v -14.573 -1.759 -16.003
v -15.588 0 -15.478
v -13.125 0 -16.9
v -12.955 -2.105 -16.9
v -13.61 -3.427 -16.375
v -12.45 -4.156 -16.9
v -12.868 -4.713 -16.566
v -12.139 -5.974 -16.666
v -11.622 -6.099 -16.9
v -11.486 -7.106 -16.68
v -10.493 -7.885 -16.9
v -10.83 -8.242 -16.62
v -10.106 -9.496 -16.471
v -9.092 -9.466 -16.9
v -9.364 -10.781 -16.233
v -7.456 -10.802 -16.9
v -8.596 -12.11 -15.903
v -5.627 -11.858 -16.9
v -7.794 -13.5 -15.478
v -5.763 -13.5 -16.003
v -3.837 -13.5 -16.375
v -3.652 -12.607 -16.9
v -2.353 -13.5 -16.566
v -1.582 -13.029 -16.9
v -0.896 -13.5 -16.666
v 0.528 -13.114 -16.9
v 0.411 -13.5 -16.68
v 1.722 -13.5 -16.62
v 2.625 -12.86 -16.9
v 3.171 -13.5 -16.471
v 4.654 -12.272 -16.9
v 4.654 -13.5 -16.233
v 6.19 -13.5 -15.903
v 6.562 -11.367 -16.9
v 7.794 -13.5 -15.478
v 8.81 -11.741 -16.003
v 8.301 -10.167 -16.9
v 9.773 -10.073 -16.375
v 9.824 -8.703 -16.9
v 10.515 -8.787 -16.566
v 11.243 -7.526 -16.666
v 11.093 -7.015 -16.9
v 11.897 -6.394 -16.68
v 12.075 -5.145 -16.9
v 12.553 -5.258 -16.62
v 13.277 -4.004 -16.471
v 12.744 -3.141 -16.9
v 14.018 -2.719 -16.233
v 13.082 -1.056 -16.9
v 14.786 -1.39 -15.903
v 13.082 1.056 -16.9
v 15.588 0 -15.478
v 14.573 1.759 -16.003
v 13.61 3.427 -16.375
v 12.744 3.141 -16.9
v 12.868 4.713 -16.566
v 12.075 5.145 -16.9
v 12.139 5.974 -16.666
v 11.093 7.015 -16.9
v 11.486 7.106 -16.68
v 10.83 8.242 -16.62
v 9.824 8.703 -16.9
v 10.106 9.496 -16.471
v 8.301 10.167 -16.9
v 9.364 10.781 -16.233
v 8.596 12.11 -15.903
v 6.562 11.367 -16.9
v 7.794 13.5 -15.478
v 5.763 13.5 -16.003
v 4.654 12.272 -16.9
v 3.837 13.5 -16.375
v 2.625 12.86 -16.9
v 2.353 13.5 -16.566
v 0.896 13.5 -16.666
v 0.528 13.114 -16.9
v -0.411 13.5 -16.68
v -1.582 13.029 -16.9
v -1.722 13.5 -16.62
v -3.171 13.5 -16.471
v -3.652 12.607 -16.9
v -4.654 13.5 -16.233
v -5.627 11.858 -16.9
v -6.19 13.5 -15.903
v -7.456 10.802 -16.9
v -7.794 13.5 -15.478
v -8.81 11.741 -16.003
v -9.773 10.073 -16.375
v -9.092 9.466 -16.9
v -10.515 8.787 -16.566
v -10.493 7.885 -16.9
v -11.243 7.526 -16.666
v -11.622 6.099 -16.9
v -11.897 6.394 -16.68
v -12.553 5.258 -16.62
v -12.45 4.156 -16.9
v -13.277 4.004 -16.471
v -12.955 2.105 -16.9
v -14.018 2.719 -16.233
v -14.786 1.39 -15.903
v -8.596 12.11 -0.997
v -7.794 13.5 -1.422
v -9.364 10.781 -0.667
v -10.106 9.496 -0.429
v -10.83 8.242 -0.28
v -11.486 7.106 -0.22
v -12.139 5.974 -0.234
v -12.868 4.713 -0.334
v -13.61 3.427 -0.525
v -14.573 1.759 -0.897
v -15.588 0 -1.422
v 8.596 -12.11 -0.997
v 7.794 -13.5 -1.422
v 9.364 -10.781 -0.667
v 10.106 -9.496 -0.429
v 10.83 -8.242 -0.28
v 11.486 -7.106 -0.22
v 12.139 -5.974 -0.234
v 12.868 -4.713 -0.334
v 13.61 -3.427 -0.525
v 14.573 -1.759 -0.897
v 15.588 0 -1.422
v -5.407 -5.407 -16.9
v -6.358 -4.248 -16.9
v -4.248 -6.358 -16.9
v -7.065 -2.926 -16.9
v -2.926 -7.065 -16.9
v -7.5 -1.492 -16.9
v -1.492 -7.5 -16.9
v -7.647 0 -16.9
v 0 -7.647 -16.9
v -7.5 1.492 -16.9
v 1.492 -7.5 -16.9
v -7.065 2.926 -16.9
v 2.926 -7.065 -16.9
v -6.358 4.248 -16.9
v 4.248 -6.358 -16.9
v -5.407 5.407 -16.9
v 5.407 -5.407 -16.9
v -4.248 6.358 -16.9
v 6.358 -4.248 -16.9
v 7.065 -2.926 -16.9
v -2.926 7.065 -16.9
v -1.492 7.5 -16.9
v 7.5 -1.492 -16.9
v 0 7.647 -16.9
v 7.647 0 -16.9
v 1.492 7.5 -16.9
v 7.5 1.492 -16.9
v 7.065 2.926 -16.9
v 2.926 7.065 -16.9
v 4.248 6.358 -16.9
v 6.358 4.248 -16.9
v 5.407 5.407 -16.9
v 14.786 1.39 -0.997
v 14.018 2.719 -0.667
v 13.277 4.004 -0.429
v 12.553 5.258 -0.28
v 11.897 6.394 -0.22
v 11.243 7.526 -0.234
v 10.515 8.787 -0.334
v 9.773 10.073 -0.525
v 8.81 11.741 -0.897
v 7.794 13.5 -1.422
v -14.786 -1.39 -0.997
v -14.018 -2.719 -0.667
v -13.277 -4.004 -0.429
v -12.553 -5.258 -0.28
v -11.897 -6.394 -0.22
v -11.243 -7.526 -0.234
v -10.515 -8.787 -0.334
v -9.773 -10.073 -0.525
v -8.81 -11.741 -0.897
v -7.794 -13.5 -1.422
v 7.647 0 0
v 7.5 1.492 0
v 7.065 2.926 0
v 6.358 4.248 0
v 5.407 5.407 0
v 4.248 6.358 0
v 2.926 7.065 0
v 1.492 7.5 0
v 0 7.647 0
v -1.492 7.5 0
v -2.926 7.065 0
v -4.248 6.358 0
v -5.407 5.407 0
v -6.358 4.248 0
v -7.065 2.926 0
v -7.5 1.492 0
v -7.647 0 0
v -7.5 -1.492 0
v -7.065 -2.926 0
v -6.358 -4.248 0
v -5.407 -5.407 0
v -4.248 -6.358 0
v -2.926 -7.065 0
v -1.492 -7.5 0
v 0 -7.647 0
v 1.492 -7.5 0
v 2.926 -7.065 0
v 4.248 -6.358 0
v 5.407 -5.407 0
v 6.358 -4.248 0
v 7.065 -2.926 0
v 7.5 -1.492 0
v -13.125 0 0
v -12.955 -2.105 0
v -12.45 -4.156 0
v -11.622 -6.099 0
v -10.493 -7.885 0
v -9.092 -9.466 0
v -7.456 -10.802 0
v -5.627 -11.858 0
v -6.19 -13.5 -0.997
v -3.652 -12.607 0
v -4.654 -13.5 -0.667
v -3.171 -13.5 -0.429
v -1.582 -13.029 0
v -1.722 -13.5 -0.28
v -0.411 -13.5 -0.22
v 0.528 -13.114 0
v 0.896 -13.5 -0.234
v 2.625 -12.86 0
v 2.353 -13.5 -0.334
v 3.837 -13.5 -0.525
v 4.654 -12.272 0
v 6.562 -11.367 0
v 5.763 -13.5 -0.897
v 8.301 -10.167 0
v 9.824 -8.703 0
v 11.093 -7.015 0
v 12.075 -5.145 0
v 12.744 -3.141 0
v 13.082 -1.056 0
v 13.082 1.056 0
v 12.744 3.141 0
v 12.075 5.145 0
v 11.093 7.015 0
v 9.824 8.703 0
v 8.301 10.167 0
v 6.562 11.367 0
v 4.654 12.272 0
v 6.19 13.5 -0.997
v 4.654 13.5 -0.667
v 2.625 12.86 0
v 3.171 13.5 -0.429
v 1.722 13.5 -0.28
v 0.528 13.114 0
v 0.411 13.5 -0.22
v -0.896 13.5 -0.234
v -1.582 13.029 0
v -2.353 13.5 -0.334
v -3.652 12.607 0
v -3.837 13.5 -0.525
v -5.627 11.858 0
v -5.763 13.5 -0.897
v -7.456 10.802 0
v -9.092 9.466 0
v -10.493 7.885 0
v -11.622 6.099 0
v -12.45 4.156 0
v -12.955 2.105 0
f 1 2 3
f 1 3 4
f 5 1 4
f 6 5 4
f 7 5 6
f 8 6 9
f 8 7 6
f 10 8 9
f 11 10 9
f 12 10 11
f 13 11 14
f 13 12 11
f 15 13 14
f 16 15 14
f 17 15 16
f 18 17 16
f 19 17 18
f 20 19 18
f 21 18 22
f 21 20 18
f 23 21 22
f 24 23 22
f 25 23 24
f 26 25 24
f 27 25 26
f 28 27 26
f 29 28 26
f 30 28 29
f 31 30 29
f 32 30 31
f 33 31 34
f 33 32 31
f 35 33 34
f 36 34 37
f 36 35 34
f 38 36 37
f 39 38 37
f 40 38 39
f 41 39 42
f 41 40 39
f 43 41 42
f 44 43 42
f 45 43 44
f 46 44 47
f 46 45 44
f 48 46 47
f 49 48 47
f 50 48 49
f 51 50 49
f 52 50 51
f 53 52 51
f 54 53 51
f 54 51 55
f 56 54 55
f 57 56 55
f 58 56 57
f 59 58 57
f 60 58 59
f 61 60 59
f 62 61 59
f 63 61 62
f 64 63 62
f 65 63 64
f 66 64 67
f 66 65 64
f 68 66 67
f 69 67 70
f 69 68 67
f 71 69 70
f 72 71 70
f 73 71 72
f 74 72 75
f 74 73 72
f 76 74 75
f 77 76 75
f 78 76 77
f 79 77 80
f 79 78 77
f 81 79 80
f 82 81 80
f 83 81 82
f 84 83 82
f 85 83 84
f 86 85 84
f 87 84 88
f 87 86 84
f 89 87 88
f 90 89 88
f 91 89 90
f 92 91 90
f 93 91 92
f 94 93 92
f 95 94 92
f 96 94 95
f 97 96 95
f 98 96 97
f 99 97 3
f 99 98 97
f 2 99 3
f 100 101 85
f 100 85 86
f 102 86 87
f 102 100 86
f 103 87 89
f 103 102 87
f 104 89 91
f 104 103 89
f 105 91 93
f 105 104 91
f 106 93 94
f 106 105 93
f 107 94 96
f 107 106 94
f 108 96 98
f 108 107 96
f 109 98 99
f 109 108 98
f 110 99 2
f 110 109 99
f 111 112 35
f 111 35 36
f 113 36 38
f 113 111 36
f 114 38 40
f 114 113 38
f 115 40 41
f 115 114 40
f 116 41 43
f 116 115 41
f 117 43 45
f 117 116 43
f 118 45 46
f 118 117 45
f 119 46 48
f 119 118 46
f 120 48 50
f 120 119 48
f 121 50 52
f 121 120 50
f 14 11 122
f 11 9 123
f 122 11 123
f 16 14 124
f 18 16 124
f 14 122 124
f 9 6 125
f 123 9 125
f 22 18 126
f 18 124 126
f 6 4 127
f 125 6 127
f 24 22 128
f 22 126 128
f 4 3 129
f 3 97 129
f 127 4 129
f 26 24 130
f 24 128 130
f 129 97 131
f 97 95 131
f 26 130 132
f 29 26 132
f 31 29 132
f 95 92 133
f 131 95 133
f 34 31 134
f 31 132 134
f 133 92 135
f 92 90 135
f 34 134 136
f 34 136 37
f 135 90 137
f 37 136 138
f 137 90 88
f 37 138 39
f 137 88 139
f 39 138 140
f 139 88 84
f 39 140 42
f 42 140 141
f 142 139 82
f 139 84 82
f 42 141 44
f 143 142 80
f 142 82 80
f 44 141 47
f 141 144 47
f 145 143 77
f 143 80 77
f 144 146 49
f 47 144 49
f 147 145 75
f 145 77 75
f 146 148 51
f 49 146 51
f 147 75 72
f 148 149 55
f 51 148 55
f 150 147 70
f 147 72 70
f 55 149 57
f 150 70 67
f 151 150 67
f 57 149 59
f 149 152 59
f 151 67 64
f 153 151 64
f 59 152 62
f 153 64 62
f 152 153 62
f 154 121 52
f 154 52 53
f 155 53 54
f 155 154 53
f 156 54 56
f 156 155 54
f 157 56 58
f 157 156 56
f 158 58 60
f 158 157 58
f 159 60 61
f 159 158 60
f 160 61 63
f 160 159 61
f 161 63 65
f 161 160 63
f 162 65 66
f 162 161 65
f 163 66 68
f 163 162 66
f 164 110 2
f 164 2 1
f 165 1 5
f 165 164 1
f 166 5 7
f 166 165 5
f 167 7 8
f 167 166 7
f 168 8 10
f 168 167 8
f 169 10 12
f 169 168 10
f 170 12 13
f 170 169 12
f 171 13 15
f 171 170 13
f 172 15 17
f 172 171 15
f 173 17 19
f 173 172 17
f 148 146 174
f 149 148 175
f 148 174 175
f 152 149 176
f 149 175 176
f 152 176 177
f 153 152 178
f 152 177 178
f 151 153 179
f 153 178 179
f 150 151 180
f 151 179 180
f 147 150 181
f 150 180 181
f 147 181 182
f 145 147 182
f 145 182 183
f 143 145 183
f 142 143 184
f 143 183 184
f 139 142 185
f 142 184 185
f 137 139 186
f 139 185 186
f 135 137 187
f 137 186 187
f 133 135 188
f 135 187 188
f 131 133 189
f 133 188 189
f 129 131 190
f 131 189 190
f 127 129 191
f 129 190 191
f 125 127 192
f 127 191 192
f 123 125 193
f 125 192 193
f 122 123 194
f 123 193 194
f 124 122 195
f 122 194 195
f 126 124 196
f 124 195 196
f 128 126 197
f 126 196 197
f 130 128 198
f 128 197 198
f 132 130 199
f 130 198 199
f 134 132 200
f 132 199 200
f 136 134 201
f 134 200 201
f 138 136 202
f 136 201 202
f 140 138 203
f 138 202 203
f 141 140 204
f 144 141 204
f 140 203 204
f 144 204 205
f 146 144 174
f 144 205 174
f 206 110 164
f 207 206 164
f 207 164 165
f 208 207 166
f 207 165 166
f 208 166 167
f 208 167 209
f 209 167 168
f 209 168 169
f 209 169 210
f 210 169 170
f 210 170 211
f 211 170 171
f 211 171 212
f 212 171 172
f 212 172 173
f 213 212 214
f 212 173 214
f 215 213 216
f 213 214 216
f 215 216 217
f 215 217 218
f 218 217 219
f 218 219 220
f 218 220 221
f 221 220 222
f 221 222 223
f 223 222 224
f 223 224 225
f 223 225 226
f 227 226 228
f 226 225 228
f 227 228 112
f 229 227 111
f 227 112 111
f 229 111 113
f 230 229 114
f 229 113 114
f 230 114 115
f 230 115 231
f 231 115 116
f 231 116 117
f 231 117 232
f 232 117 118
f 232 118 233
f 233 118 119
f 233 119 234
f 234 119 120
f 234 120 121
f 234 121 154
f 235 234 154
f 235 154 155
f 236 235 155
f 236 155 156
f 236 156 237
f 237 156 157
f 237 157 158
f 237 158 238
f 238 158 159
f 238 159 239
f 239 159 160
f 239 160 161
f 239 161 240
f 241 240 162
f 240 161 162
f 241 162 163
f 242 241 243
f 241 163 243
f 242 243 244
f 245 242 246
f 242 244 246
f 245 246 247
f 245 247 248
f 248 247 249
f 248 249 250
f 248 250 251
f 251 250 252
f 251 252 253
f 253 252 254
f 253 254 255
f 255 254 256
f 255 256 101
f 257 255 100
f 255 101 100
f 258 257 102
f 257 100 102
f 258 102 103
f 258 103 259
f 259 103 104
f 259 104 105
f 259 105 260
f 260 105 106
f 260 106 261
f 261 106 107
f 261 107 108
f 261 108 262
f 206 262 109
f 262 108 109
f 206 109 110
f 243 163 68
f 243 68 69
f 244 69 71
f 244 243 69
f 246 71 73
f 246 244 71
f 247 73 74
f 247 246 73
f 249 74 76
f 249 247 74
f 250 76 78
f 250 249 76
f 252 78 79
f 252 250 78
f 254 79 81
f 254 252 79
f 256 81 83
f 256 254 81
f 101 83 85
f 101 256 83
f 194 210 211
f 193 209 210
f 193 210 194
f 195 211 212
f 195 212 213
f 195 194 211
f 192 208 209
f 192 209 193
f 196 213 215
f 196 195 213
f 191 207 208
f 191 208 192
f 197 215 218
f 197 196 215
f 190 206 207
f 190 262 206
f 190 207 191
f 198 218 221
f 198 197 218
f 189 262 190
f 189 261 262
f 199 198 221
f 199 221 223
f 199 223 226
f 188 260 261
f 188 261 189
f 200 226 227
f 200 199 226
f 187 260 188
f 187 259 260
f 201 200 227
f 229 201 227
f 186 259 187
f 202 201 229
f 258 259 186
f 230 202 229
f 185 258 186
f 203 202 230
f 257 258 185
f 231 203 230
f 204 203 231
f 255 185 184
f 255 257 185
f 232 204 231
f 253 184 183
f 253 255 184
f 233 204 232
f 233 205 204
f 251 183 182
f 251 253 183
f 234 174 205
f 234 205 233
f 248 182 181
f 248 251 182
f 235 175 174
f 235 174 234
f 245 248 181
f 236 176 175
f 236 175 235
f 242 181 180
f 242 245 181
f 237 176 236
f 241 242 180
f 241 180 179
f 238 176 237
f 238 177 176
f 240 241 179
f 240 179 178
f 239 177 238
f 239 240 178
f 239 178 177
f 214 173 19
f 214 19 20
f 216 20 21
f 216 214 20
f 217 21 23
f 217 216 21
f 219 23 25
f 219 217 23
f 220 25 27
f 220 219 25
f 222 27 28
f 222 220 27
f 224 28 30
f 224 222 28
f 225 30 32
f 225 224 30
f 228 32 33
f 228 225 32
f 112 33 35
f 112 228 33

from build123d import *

# Parameters (mm, degrees)
SKETCH1_R     = 7.647
BASENUT_DEPTH = 16.9


with BuildPart() as part:
    # Sketch1 → BaseNut (new body)
    with BuildSketch(Plane.XY):
        Polygon((7.794228634, -13.5), (15.588457268, 0), (7.794228634, 13.5), (-7.794228634, 13.5), (-15.588457268, 0), (-7.794228634, -13.5), align=None)
        Circle(SKETCH1_R, mode=Mode.SUBTRACT)
    extrude(amount=-BASENUT_DEPTH)

    # Sketch2 → Double-Chamfer (revolve, cut)
    with BuildSketch(Plane(origin=(0, 0, 0), x_dir=(1, 0, 0), z_dir=(0, 1, 0))):
        Polygon((-15.588457268, 16.9), (-13.125, 16.9), (-15.588457268, 15.477722283), align=None)
        Polygon((-15.588457268, 1.422277717), (-15.588457268, 0), (-13.125, 0), align=None)
    revolve(axis=Axis((0, 0, -3.375940562), (0, 0, 1)), mode=Mode.SUBTRACT)


solid = part.part
